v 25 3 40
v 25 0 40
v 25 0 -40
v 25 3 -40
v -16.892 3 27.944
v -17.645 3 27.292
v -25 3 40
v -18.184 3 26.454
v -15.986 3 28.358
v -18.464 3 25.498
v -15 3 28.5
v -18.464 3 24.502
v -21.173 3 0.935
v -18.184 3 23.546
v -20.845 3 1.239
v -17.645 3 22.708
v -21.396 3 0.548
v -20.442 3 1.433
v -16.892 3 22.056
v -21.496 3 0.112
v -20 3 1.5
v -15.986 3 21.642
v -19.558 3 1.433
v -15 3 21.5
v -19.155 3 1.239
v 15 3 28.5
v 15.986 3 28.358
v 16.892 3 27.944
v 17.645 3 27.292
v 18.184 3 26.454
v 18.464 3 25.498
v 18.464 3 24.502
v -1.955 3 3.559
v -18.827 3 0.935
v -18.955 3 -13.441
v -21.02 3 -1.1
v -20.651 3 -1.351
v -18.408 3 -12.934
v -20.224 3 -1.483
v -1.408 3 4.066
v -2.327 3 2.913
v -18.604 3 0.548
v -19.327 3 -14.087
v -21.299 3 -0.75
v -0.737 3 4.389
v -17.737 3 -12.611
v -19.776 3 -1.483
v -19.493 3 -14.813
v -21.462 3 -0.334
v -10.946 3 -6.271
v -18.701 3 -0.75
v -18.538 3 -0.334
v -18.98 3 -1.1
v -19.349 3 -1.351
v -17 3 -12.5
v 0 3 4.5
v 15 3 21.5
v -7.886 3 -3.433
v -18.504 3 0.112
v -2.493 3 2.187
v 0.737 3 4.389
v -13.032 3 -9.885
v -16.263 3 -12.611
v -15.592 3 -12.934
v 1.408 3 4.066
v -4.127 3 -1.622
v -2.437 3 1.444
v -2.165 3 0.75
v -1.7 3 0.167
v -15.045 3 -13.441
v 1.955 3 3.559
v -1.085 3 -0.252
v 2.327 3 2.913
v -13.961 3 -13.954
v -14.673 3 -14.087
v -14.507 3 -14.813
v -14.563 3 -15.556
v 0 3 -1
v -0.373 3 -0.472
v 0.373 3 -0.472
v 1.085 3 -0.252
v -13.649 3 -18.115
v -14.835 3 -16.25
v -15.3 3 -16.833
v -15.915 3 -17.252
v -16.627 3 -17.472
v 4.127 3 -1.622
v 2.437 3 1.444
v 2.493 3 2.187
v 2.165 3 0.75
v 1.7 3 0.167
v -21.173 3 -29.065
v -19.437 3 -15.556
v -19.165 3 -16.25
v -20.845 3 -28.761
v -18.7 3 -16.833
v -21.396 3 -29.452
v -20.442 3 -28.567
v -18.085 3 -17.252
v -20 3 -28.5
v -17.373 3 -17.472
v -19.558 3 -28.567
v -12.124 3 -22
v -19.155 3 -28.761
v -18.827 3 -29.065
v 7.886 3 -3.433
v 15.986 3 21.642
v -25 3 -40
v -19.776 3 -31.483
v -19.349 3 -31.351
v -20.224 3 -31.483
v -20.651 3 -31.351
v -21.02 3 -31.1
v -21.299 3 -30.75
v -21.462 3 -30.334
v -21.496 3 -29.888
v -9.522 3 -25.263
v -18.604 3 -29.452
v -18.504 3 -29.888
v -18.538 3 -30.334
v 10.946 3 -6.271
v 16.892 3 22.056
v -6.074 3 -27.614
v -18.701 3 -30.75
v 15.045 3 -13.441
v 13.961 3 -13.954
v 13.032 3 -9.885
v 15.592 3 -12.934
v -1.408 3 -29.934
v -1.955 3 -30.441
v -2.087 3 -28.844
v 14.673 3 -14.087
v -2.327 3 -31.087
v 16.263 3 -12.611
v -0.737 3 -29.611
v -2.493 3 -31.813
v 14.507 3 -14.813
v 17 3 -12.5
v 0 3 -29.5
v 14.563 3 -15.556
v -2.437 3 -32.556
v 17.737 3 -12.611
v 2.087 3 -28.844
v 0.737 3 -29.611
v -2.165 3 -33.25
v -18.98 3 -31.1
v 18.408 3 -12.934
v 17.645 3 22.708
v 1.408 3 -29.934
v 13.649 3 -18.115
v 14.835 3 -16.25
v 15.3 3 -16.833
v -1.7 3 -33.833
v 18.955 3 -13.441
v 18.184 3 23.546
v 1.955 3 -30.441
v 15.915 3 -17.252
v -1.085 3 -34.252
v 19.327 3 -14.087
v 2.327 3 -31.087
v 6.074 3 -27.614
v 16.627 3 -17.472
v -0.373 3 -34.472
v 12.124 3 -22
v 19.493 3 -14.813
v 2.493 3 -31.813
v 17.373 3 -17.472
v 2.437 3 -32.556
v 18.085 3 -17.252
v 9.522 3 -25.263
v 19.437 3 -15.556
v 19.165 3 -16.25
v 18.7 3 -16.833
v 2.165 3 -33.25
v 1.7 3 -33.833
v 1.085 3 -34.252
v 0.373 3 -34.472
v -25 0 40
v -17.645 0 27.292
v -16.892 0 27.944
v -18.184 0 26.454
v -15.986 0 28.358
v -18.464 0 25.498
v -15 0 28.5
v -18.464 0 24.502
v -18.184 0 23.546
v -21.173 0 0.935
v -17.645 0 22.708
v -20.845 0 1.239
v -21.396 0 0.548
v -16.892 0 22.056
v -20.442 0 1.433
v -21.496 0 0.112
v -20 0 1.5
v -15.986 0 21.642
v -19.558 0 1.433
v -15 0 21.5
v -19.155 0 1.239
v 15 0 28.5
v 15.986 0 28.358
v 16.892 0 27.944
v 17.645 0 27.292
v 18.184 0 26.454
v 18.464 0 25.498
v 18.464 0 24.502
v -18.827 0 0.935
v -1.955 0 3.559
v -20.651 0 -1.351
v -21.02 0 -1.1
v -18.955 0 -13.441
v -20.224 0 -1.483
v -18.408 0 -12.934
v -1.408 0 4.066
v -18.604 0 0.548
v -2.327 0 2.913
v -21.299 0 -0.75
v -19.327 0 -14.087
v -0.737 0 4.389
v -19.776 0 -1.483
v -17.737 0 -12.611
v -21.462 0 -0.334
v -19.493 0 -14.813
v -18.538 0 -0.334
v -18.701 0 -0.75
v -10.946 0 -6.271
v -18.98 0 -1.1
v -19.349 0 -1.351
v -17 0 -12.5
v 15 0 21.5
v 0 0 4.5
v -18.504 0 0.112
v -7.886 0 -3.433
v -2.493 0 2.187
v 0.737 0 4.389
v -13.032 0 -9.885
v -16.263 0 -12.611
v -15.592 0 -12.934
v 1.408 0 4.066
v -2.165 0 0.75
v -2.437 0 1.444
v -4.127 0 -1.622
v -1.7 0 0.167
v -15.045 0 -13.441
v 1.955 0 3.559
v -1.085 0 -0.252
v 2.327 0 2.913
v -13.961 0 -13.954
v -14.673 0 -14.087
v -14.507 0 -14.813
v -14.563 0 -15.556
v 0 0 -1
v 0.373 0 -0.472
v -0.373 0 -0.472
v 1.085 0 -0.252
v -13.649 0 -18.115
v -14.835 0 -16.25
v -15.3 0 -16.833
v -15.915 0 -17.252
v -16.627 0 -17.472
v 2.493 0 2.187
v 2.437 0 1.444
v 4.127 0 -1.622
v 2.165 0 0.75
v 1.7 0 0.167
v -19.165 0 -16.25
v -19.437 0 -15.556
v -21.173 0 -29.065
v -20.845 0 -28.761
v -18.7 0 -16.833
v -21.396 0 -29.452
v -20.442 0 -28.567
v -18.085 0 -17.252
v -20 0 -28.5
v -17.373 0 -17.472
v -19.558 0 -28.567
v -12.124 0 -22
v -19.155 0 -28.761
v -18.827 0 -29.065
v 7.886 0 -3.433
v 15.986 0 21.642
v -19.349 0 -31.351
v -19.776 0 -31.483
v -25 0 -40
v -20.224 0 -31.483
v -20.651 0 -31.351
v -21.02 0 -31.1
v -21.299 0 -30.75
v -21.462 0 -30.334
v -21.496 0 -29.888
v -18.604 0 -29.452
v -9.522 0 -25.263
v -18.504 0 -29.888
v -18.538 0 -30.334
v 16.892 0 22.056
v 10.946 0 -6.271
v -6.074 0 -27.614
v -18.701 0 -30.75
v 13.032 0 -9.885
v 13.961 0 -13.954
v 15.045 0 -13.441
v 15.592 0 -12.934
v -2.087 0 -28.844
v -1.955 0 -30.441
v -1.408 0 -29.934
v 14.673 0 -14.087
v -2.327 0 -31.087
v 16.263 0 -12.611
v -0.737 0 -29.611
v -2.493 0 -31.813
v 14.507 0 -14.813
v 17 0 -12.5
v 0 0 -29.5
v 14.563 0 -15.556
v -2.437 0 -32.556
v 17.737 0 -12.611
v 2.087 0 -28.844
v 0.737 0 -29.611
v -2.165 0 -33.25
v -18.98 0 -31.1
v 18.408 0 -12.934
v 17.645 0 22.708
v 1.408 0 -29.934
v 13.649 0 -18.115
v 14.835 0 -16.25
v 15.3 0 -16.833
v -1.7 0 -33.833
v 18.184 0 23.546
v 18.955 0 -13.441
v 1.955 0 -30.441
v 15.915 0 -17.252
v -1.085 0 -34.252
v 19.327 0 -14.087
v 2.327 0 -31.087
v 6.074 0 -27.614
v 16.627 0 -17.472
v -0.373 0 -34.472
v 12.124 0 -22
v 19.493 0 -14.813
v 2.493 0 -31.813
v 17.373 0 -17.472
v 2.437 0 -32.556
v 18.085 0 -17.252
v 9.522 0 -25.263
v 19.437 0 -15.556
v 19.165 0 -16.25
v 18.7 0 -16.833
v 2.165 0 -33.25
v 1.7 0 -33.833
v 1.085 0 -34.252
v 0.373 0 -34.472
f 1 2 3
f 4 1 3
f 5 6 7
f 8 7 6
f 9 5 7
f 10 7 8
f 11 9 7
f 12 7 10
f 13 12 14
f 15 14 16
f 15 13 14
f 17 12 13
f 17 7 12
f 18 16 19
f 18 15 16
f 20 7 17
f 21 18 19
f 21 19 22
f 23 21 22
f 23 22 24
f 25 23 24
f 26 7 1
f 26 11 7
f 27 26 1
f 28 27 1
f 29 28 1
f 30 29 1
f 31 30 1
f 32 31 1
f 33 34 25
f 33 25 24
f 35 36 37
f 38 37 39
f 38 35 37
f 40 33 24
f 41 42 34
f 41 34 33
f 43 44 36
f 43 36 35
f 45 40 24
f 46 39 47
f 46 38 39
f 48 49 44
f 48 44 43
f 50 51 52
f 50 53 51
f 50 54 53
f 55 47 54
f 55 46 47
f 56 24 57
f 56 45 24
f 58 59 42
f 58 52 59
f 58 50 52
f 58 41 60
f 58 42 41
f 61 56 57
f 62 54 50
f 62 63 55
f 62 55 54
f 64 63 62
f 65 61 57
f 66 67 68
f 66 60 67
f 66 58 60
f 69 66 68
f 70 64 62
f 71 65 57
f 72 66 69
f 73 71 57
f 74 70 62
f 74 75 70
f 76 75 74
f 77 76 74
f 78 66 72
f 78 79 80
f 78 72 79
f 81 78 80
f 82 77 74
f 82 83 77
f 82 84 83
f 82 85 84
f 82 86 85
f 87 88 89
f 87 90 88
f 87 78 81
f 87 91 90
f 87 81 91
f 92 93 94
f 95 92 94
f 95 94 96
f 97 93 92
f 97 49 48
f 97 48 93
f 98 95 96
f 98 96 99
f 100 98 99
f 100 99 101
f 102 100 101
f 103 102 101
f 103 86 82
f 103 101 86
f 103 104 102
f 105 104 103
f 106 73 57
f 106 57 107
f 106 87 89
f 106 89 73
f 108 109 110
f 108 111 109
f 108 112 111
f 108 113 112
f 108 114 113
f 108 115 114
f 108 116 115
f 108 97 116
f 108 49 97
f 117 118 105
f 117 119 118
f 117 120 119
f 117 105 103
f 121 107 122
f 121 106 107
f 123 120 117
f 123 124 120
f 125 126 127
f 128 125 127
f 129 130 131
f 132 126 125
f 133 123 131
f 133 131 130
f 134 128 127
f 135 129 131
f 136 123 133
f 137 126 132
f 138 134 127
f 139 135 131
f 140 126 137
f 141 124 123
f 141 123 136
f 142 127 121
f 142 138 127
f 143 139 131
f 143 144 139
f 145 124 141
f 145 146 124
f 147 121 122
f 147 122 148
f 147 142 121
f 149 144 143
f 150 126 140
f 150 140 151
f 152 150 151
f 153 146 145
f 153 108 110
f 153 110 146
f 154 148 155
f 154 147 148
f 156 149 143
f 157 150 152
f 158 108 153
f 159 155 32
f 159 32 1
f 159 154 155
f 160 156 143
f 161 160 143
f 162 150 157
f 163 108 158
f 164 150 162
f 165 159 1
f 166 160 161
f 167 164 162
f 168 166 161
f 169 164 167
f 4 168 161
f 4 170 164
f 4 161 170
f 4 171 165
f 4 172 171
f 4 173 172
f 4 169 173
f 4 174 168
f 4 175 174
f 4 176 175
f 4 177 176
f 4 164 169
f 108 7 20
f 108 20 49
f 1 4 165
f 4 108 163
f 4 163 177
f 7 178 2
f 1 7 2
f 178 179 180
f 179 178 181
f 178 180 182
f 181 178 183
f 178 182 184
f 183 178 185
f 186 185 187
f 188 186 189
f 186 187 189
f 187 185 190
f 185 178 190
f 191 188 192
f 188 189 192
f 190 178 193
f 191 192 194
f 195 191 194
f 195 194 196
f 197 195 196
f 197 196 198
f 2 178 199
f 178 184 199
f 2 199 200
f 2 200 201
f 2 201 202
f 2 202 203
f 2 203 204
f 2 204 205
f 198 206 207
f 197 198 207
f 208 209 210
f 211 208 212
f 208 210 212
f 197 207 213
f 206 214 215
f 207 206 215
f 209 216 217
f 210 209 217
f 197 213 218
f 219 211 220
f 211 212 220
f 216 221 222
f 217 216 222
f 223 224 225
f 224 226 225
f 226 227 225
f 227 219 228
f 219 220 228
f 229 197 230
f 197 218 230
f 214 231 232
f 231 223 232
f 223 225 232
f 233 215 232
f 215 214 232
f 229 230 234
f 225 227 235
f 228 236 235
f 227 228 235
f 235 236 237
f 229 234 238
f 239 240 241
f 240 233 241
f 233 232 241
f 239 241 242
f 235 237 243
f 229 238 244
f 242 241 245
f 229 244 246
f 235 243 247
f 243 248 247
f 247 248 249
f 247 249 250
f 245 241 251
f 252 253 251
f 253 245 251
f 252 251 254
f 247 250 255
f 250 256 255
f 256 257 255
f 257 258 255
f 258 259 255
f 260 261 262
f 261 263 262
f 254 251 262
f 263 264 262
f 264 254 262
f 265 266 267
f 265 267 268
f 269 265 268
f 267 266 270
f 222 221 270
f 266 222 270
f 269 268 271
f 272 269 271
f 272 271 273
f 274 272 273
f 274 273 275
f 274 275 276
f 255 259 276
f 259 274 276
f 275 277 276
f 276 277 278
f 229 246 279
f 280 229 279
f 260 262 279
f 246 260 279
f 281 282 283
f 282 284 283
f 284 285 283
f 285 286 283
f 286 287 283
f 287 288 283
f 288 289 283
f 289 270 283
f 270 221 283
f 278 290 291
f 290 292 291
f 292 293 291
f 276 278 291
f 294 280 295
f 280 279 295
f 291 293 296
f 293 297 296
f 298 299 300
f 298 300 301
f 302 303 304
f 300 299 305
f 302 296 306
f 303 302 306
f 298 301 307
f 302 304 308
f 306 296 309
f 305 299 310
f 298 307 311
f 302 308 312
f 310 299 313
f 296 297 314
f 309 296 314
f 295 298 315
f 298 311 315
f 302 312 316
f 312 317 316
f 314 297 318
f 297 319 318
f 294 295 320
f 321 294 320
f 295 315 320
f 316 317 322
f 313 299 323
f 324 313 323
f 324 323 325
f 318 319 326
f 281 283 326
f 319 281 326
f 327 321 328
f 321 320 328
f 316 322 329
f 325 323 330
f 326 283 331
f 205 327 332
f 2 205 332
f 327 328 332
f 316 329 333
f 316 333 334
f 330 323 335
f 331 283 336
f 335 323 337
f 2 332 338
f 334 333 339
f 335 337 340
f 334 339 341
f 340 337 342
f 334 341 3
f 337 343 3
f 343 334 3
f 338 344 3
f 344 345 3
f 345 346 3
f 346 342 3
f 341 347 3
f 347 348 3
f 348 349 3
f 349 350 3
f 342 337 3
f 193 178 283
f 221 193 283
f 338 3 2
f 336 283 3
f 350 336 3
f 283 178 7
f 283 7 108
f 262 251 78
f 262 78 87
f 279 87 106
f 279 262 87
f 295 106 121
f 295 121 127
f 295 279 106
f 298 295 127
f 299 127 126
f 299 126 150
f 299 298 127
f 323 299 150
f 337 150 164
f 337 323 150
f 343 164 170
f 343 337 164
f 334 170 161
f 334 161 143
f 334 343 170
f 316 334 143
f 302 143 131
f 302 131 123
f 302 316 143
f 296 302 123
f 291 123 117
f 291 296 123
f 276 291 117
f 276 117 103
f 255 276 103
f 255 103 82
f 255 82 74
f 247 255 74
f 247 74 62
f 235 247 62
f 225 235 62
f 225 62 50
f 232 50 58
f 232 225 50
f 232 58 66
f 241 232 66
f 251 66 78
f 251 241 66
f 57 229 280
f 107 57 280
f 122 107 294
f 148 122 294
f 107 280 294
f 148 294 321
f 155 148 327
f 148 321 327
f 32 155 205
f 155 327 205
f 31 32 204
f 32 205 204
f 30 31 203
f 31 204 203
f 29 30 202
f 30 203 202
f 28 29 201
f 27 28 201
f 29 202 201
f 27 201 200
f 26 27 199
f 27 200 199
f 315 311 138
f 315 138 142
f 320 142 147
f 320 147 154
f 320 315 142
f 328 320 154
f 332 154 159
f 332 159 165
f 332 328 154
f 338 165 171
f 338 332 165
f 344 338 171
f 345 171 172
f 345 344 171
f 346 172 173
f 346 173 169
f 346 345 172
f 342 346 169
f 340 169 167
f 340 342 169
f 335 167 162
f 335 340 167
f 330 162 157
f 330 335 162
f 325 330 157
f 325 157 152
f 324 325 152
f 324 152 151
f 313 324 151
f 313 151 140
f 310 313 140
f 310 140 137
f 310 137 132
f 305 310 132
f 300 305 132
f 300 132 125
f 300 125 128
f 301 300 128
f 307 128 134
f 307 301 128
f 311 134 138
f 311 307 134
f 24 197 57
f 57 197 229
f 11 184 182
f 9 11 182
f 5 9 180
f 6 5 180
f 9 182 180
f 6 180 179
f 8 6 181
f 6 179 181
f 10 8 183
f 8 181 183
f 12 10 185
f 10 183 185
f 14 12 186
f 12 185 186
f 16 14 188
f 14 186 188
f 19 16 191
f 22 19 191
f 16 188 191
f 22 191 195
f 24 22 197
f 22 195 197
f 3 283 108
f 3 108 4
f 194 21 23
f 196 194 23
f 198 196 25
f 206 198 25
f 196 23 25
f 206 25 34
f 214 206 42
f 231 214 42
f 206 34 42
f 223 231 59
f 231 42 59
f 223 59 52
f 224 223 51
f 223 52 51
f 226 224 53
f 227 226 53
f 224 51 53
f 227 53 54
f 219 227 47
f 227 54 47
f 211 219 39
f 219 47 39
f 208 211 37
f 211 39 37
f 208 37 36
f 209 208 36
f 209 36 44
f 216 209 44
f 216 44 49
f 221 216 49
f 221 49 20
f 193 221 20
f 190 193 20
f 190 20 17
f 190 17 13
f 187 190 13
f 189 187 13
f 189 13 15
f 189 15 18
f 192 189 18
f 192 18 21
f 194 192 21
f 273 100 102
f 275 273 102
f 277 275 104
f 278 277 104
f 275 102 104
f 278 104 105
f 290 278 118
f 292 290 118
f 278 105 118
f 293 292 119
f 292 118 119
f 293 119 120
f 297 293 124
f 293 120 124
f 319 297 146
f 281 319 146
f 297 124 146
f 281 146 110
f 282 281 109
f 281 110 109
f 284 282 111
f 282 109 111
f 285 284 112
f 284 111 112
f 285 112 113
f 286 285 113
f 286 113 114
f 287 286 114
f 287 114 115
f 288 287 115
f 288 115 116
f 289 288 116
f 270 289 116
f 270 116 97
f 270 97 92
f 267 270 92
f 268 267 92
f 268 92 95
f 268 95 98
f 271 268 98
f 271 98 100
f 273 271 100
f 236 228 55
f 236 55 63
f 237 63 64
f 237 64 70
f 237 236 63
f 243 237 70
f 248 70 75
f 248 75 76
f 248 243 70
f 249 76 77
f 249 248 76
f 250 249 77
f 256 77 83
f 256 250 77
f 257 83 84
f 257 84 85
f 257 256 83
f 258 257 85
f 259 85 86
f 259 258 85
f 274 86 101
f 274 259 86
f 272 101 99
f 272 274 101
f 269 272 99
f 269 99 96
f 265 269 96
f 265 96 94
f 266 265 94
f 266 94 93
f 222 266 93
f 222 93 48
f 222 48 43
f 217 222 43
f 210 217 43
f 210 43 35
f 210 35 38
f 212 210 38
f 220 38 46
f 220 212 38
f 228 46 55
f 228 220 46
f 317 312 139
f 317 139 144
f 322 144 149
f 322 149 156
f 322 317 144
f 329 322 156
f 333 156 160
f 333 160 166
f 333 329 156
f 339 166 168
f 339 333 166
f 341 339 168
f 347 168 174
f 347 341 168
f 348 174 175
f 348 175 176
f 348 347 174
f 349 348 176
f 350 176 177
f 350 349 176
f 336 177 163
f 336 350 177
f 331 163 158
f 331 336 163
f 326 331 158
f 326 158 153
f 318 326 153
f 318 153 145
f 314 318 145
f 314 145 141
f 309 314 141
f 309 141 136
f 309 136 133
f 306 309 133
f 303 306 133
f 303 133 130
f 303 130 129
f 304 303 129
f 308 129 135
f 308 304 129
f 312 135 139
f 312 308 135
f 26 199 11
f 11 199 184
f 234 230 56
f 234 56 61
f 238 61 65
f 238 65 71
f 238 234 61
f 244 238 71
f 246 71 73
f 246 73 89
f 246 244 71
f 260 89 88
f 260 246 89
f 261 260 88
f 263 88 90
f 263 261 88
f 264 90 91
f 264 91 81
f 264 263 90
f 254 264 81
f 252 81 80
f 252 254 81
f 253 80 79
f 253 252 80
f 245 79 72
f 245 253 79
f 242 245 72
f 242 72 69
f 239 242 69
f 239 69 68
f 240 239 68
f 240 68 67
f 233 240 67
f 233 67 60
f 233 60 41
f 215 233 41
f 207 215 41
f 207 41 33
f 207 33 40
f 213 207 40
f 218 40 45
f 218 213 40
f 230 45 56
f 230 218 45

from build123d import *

# Parameters (mm, degrees)
SKETCH1_W           = 50
SKETCH1_H           = 80
SKETCH1_R           = 2.5
SKETCH1_R_2         = 14
BOSS_EXTRUDE1_DEPTH = 3
SKETCH2_R           = 1.5
CUT_EXTRUDE1_DEPTH  = 10


with BuildPart() as part:
    # Sketch1 → Boss-Extrude1 (new body)
    with BuildSketch(Plane(origin=(0, 0, 0), x_dir=(1, 0, 0), z_dir=(0, 1, 0))):
        Rectangle(SKETCH1_W, SKETCH1_H)
        with Locations(Location((0, 32, 0), (0, 0, 270))):
            Circle(SKETCH1_R, mode=Mode.SUBTRACT)
        with Locations(Location((17, 15, 0), (0, 0, 270))):
            Circle(SKETCH1_R, mode=Mode.SUBTRACT)
        with Locations(Location((0, -2, 0), (0, 0, 270))):
            Circle(SKETCH1_R, mode=Mode.SUBTRACT)
        with Locations(Location((-17, 15, 0), (0, 0, 270))):
            Circle(SKETCH1_R, mode=Mode.SUBTRACT)
        with Locations(Location((0, 15, 0), (0, 0, 270))):
            Circle(SKETCH1_R_2, mode=Mode.SUBTRACT)
        with BuildLine():
            Line((-15, -21.5), (15, -21.5))
            ThreePointArc((15, -21.5), (18.5, -25), (15, -28.5))
            Line((15, -28.5), (-15, -28.5))
            ThreePointArc((-15, -28.5), (-18.5, -25), (-15, -21.5))
        make_face(mode=Mode.SUBTRACT)
    extrude(amount=BOSS_EXTRUDE1_DEPTH)

    # Sketch2 → Cut-Extrude1 (cut)
    with BuildSketch(Plane(origin=(0, 3, 0), x_dir=(1, 0, 0), z_dir=(0, 1, 0))):
        with Locations(Location((-20, 30, 0), (0, 0, 270))):
            Circle(SKETCH2_R)
        with Locations(Location((-20, 0, 0), (0, 0, 270))):
            Circle(SKETCH2_R)
    extrude(amount=-CUT_EXTRUDE1_DEPTH, mode=Mode.SUBTRACT)


solid = part.part
